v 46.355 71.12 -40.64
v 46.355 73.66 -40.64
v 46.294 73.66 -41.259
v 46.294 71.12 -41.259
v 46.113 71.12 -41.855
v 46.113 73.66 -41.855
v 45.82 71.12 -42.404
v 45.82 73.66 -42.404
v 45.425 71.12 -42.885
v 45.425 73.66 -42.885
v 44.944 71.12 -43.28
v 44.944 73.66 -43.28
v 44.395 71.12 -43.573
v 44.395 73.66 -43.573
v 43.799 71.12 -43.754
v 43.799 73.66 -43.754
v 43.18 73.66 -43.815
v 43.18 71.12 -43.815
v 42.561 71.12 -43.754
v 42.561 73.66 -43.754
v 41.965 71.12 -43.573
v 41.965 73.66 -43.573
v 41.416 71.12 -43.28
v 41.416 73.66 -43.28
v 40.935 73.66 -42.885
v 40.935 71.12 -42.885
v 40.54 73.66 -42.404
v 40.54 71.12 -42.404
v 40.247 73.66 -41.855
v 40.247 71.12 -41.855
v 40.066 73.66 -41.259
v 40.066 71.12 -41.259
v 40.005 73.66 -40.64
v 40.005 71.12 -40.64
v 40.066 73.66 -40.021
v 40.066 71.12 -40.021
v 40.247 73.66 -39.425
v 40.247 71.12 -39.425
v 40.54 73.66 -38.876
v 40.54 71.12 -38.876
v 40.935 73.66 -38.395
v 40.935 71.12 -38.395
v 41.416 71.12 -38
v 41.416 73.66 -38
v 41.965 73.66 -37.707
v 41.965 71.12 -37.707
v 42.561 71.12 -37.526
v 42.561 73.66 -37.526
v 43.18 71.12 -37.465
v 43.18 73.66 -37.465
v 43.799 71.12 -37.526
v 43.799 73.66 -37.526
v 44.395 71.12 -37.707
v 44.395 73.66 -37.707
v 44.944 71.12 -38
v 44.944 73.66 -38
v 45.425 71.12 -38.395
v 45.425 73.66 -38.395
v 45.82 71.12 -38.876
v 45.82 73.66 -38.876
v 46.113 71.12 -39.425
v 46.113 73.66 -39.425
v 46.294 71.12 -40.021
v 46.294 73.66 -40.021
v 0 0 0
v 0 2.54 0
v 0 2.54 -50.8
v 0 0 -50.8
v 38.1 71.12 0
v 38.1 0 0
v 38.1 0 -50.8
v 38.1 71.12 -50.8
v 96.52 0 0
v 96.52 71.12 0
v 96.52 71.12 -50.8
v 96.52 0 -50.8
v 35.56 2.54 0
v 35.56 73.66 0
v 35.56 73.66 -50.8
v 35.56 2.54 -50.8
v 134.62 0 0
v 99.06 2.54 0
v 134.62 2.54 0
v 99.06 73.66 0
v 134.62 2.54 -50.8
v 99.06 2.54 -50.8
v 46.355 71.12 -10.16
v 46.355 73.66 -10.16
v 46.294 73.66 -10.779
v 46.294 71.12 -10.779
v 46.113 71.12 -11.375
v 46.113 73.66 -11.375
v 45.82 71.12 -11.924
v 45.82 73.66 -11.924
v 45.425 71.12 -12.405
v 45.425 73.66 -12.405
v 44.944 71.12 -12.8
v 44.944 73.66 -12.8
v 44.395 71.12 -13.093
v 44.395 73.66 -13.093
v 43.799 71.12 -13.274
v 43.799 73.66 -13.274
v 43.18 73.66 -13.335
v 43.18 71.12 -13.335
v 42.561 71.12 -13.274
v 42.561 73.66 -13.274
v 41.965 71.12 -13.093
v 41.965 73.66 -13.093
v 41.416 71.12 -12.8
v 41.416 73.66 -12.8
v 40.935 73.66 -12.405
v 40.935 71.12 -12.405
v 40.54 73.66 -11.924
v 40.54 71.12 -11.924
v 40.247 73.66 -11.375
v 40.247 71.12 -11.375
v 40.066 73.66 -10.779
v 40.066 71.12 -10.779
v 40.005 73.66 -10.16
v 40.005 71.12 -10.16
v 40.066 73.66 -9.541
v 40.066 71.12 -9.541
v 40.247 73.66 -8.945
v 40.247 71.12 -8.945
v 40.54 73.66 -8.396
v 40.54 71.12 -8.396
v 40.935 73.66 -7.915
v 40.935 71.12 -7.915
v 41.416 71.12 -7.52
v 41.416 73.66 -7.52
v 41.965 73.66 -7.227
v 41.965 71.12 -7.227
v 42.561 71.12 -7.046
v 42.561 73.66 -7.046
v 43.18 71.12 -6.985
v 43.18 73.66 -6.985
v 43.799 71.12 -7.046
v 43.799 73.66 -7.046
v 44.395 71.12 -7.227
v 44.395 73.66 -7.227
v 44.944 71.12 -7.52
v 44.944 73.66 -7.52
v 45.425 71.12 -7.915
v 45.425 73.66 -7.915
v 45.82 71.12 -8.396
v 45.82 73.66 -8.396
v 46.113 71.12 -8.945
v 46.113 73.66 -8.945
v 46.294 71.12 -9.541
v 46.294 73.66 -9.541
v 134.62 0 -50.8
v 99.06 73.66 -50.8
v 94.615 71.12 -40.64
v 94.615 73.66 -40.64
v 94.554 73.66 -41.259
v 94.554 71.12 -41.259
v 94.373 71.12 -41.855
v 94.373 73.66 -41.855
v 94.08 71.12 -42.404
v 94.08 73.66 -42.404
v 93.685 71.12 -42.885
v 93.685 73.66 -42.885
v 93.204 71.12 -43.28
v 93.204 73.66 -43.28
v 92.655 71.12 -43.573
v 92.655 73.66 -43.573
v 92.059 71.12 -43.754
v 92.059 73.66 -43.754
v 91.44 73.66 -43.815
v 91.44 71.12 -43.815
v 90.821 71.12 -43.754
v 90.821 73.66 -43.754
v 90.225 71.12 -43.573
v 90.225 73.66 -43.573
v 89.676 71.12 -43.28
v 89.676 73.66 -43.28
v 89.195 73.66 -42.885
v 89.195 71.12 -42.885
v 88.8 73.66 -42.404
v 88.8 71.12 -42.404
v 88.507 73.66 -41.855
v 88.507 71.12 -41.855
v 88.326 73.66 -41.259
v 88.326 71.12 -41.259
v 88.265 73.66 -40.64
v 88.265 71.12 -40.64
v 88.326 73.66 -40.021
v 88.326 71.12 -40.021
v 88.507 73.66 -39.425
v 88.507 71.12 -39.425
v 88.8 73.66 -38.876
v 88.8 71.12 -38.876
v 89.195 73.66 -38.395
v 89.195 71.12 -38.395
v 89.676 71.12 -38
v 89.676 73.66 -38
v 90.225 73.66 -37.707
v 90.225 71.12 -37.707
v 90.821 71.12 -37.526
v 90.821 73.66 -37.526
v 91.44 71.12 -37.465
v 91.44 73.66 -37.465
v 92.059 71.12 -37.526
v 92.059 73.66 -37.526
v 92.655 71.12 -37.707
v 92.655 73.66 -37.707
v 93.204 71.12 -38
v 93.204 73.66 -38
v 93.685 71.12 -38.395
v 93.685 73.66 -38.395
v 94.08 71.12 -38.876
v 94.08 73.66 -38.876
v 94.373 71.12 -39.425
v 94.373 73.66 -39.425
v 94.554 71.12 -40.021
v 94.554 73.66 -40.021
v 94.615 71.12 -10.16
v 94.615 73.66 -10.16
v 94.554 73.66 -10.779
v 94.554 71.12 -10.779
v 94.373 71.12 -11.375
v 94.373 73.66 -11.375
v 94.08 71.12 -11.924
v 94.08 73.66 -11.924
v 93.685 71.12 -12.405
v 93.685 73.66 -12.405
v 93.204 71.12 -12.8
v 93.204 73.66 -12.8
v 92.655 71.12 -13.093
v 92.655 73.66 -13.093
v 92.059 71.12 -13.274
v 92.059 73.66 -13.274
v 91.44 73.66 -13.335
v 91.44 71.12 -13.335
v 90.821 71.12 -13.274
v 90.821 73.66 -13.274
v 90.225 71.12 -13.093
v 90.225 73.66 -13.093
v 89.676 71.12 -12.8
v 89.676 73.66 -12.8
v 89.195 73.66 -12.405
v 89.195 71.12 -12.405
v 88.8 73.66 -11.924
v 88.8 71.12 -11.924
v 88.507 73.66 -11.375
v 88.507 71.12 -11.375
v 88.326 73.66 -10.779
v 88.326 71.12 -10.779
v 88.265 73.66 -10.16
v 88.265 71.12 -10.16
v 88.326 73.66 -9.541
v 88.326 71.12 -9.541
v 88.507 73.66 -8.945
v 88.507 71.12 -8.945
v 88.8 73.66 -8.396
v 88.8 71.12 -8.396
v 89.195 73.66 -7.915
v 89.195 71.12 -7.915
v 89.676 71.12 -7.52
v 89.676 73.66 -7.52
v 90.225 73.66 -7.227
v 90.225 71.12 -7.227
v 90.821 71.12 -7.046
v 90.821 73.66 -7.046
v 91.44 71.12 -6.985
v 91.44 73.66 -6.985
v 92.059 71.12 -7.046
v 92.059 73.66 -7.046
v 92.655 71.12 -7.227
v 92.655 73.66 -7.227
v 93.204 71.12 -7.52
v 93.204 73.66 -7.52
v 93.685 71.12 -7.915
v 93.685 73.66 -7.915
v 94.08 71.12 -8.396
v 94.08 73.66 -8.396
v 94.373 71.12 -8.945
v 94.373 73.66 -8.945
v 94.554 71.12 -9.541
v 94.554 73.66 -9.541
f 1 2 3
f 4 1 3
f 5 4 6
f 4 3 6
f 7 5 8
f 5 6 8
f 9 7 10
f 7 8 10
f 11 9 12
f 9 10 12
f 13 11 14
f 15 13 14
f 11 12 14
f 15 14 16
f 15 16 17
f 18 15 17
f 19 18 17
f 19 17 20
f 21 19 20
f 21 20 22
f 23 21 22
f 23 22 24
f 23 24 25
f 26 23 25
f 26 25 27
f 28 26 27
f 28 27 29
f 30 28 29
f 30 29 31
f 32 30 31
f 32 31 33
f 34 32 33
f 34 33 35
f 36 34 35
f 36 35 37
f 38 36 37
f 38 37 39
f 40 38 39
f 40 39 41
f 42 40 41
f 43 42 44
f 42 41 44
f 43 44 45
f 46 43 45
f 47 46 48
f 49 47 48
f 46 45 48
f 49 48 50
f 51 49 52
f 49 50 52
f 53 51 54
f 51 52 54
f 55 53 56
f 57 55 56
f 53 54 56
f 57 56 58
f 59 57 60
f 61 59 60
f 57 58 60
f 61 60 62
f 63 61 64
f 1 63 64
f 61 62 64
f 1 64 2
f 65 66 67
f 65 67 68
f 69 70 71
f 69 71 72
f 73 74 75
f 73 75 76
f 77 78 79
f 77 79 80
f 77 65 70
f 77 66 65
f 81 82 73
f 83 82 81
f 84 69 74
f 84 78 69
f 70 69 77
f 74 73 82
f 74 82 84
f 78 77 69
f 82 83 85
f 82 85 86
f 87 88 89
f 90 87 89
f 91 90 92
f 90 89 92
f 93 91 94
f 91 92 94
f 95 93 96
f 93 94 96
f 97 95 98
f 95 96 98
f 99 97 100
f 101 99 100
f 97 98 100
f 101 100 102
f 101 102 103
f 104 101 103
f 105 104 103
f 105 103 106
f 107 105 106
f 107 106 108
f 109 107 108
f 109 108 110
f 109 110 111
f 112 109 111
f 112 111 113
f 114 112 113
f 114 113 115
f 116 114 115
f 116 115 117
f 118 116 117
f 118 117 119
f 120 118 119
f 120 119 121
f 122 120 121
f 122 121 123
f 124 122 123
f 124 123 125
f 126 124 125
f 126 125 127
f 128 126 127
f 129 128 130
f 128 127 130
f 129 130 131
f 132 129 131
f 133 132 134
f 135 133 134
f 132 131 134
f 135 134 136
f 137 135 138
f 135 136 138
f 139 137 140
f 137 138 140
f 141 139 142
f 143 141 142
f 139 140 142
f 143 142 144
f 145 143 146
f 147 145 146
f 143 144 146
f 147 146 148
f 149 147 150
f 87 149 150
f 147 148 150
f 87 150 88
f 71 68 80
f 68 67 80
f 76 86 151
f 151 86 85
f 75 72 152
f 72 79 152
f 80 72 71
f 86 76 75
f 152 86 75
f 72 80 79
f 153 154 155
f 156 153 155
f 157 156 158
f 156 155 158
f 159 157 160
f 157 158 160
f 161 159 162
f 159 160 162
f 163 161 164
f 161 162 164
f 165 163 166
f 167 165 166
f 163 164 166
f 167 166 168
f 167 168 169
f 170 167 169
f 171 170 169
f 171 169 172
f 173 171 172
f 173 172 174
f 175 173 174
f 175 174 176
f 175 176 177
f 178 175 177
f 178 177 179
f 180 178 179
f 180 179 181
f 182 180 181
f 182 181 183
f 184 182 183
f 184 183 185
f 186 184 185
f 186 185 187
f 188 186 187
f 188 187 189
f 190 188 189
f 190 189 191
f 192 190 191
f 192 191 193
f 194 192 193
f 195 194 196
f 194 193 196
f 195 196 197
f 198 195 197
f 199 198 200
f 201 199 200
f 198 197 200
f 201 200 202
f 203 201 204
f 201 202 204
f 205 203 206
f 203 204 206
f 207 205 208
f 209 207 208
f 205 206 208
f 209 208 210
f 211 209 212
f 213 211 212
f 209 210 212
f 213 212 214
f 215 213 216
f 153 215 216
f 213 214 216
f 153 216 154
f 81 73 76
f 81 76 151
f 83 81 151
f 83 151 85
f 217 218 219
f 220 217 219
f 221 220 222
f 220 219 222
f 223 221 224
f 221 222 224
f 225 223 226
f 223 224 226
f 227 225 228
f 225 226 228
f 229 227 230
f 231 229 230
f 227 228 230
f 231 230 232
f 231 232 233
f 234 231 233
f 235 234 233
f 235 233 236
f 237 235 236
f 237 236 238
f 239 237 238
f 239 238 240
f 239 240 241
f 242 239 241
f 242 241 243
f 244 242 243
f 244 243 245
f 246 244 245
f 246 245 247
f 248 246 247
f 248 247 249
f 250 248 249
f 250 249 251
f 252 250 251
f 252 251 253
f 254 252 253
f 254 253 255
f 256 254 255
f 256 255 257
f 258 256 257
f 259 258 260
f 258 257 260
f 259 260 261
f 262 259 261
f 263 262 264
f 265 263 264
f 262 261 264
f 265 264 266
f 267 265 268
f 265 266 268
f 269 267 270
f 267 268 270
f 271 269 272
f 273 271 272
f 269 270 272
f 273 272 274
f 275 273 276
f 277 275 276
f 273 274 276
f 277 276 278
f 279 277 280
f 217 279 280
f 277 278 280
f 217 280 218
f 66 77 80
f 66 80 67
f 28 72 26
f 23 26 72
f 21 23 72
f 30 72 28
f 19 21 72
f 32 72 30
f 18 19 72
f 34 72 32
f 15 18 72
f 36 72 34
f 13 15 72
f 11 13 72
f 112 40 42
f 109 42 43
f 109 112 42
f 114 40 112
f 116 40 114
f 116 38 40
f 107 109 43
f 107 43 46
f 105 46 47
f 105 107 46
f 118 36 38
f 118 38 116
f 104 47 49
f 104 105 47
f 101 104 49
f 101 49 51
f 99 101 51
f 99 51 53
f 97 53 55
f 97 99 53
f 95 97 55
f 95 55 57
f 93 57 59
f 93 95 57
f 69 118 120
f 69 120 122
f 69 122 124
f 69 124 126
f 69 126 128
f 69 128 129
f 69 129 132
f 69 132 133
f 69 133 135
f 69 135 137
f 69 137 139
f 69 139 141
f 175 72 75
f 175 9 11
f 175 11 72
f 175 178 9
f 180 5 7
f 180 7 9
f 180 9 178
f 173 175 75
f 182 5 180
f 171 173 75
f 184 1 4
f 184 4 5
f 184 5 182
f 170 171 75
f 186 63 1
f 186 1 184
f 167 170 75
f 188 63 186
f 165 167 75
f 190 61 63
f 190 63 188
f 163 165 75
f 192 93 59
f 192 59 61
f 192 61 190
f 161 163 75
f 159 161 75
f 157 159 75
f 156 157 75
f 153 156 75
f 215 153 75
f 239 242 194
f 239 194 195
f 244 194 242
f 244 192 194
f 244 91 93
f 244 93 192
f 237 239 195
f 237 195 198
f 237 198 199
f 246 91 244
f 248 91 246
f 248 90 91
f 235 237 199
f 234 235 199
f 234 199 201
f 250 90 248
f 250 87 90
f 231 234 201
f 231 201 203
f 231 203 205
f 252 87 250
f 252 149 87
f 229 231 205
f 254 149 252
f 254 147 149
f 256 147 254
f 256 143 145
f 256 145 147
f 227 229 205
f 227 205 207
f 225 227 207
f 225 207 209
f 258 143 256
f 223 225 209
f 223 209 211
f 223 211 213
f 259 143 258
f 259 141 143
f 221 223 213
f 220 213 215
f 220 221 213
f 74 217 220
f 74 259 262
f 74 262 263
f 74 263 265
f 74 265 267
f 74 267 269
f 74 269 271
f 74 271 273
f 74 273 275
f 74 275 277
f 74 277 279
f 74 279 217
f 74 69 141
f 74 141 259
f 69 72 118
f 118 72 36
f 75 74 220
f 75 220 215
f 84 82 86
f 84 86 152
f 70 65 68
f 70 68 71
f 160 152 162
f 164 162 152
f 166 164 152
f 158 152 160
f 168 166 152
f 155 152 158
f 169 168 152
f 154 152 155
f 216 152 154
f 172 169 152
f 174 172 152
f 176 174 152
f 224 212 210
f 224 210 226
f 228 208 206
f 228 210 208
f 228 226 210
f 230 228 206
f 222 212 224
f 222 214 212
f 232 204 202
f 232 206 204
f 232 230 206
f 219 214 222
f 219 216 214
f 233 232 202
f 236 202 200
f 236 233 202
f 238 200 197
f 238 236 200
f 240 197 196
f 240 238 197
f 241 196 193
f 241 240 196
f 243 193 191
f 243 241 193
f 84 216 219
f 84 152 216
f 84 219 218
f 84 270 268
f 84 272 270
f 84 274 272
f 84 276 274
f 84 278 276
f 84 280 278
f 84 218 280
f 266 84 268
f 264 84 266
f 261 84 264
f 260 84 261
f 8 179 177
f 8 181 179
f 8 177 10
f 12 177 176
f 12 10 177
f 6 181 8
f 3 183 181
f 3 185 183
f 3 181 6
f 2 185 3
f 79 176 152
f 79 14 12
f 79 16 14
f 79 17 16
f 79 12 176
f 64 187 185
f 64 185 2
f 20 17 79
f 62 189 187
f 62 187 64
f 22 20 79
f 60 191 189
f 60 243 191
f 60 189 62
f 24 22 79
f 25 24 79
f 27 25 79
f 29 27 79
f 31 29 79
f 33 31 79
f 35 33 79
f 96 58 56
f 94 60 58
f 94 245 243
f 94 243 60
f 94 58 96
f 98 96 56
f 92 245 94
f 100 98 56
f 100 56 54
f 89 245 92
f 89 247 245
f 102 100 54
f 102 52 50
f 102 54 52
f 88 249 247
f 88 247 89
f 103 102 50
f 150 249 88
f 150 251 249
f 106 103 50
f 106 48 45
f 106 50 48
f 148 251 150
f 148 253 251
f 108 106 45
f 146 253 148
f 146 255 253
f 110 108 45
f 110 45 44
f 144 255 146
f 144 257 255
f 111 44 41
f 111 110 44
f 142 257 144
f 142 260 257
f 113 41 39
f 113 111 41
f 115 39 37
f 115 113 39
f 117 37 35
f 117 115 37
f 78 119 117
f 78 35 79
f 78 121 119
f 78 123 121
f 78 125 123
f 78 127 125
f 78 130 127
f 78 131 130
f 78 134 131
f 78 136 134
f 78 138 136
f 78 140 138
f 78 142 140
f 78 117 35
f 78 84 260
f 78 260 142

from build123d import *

# Parameters (mm, degrees)
BOSS_EXTRUDE1_DEPTH = 50.8
CUT_EXTRUDE1_REACH  = 75.66
SKETCH12_R          = 3.175


with BuildPart() as part:
    # Sketch11 → Boss-Extrude1 (new body)
    with BuildSketch(Plane.XY):
        Polygon((0, 0), (38.1, 0), (38.1, 71.12), (96.52, 71.12), (96.52, 0), (134.62, 0), (134.62, 2.54), (99.06, 2.54), (99.06, 73.66), (35.56, 73.66), (35.56, 2.54), (0, 2.54), align=None)
    extrude(amount=-BOSS_EXTRUDE1_DEPTH)

    # Sketch12 → Cut-Extrude1 (cut, up to next)
    with BuildSketch(Plane(origin=(0, 73.66, 0), x_dir=(1, 0, 0), z_dir=(0, 1, 0)), mode=Mode.PRIVATE) as cut_extrude1_sk1:
        with Locations((43.18, 10.16)):
            Circle(SKETCH12_R)
    cut_extrude1_tool1 = extrude(cut_extrude1_sk1.sketch, amount=-CUT_EXTRUDE1_REACH, mode=Mode.PRIVATE) & part.part
    add(cut_extrude1_tool1.solids().sort_by_distance((43.18, 73.66, -10.16))[0], mode=Mode.SUBTRACT)
    # Sketch12 → Cut-Extrude1 (cut, up to next)
    with BuildSketch(Plane(origin=(0, 73.66, 0), x_dir=(1, 0, 0), z_dir=(0, 1, 0)), mode=Mode.PRIVATE) as cut_extrude1_sk2:
        with Locations((91.44, 10.16)):
            Circle(SKETCH12_R)
    cut_extrude1_tool2 = extrude(cut_extrude1_sk2.sketch, amount=-CUT_EXTRUDE1_REACH, mode=Mode.PRIVATE) & part.part
    add(cut_extrude1_tool2.solids().sort_by_distance((91.44, 73.66, -10.16))[0], mode=Mode.SUBTRACT)
    # Sketch12 → Cut-Extrude1 (cut, up to next)
    with BuildSketch(Plane(origin=(0, 73.66, 0), x_dir=(1, 0, 0), z_dir=(0, 1, 0)), mode=Mode.PRIVATE) as cut_extrude1_sk3:
        with Locations((91.44, 40.64)):
            Circle(SKETCH12_R)
    cut_extrude1_tool3 = extrude(cut_extrude1_sk3.sketch, amount=-CUT_EXTRUDE1_REACH, mode=Mode.PRIVATE) & part.part
    add(cut_extrude1_tool3.solids().sort_by_distance((91.44, 73.66, -40.64))[0], mode=Mode.SUBTRACT)
    # Sketch12 → Cut-Extrude1 (cut, up to next)
    with BuildSketch(Plane(origin=(0, 73.66, 0), x_dir=(1, 0, 0), z_dir=(0, 1, 0)), mode=Mode.PRIVATE) as cut_extrude1_sk4:
        with Locations((43.18, 40.64)):
            Circle(SKETCH12_R)
    cut_extrude1_tool4 = extrude(cut_extrude1_sk4.sketch, amount=-CUT_EXTRUDE1_REACH, mode=Mode.PRIVATE) & part.part
    add(cut_extrude1_tool4.solids().sort_by_distance((43.18, 73.66, -40.64))[0], mode=Mode.SUBTRACT)


solid = part.part
